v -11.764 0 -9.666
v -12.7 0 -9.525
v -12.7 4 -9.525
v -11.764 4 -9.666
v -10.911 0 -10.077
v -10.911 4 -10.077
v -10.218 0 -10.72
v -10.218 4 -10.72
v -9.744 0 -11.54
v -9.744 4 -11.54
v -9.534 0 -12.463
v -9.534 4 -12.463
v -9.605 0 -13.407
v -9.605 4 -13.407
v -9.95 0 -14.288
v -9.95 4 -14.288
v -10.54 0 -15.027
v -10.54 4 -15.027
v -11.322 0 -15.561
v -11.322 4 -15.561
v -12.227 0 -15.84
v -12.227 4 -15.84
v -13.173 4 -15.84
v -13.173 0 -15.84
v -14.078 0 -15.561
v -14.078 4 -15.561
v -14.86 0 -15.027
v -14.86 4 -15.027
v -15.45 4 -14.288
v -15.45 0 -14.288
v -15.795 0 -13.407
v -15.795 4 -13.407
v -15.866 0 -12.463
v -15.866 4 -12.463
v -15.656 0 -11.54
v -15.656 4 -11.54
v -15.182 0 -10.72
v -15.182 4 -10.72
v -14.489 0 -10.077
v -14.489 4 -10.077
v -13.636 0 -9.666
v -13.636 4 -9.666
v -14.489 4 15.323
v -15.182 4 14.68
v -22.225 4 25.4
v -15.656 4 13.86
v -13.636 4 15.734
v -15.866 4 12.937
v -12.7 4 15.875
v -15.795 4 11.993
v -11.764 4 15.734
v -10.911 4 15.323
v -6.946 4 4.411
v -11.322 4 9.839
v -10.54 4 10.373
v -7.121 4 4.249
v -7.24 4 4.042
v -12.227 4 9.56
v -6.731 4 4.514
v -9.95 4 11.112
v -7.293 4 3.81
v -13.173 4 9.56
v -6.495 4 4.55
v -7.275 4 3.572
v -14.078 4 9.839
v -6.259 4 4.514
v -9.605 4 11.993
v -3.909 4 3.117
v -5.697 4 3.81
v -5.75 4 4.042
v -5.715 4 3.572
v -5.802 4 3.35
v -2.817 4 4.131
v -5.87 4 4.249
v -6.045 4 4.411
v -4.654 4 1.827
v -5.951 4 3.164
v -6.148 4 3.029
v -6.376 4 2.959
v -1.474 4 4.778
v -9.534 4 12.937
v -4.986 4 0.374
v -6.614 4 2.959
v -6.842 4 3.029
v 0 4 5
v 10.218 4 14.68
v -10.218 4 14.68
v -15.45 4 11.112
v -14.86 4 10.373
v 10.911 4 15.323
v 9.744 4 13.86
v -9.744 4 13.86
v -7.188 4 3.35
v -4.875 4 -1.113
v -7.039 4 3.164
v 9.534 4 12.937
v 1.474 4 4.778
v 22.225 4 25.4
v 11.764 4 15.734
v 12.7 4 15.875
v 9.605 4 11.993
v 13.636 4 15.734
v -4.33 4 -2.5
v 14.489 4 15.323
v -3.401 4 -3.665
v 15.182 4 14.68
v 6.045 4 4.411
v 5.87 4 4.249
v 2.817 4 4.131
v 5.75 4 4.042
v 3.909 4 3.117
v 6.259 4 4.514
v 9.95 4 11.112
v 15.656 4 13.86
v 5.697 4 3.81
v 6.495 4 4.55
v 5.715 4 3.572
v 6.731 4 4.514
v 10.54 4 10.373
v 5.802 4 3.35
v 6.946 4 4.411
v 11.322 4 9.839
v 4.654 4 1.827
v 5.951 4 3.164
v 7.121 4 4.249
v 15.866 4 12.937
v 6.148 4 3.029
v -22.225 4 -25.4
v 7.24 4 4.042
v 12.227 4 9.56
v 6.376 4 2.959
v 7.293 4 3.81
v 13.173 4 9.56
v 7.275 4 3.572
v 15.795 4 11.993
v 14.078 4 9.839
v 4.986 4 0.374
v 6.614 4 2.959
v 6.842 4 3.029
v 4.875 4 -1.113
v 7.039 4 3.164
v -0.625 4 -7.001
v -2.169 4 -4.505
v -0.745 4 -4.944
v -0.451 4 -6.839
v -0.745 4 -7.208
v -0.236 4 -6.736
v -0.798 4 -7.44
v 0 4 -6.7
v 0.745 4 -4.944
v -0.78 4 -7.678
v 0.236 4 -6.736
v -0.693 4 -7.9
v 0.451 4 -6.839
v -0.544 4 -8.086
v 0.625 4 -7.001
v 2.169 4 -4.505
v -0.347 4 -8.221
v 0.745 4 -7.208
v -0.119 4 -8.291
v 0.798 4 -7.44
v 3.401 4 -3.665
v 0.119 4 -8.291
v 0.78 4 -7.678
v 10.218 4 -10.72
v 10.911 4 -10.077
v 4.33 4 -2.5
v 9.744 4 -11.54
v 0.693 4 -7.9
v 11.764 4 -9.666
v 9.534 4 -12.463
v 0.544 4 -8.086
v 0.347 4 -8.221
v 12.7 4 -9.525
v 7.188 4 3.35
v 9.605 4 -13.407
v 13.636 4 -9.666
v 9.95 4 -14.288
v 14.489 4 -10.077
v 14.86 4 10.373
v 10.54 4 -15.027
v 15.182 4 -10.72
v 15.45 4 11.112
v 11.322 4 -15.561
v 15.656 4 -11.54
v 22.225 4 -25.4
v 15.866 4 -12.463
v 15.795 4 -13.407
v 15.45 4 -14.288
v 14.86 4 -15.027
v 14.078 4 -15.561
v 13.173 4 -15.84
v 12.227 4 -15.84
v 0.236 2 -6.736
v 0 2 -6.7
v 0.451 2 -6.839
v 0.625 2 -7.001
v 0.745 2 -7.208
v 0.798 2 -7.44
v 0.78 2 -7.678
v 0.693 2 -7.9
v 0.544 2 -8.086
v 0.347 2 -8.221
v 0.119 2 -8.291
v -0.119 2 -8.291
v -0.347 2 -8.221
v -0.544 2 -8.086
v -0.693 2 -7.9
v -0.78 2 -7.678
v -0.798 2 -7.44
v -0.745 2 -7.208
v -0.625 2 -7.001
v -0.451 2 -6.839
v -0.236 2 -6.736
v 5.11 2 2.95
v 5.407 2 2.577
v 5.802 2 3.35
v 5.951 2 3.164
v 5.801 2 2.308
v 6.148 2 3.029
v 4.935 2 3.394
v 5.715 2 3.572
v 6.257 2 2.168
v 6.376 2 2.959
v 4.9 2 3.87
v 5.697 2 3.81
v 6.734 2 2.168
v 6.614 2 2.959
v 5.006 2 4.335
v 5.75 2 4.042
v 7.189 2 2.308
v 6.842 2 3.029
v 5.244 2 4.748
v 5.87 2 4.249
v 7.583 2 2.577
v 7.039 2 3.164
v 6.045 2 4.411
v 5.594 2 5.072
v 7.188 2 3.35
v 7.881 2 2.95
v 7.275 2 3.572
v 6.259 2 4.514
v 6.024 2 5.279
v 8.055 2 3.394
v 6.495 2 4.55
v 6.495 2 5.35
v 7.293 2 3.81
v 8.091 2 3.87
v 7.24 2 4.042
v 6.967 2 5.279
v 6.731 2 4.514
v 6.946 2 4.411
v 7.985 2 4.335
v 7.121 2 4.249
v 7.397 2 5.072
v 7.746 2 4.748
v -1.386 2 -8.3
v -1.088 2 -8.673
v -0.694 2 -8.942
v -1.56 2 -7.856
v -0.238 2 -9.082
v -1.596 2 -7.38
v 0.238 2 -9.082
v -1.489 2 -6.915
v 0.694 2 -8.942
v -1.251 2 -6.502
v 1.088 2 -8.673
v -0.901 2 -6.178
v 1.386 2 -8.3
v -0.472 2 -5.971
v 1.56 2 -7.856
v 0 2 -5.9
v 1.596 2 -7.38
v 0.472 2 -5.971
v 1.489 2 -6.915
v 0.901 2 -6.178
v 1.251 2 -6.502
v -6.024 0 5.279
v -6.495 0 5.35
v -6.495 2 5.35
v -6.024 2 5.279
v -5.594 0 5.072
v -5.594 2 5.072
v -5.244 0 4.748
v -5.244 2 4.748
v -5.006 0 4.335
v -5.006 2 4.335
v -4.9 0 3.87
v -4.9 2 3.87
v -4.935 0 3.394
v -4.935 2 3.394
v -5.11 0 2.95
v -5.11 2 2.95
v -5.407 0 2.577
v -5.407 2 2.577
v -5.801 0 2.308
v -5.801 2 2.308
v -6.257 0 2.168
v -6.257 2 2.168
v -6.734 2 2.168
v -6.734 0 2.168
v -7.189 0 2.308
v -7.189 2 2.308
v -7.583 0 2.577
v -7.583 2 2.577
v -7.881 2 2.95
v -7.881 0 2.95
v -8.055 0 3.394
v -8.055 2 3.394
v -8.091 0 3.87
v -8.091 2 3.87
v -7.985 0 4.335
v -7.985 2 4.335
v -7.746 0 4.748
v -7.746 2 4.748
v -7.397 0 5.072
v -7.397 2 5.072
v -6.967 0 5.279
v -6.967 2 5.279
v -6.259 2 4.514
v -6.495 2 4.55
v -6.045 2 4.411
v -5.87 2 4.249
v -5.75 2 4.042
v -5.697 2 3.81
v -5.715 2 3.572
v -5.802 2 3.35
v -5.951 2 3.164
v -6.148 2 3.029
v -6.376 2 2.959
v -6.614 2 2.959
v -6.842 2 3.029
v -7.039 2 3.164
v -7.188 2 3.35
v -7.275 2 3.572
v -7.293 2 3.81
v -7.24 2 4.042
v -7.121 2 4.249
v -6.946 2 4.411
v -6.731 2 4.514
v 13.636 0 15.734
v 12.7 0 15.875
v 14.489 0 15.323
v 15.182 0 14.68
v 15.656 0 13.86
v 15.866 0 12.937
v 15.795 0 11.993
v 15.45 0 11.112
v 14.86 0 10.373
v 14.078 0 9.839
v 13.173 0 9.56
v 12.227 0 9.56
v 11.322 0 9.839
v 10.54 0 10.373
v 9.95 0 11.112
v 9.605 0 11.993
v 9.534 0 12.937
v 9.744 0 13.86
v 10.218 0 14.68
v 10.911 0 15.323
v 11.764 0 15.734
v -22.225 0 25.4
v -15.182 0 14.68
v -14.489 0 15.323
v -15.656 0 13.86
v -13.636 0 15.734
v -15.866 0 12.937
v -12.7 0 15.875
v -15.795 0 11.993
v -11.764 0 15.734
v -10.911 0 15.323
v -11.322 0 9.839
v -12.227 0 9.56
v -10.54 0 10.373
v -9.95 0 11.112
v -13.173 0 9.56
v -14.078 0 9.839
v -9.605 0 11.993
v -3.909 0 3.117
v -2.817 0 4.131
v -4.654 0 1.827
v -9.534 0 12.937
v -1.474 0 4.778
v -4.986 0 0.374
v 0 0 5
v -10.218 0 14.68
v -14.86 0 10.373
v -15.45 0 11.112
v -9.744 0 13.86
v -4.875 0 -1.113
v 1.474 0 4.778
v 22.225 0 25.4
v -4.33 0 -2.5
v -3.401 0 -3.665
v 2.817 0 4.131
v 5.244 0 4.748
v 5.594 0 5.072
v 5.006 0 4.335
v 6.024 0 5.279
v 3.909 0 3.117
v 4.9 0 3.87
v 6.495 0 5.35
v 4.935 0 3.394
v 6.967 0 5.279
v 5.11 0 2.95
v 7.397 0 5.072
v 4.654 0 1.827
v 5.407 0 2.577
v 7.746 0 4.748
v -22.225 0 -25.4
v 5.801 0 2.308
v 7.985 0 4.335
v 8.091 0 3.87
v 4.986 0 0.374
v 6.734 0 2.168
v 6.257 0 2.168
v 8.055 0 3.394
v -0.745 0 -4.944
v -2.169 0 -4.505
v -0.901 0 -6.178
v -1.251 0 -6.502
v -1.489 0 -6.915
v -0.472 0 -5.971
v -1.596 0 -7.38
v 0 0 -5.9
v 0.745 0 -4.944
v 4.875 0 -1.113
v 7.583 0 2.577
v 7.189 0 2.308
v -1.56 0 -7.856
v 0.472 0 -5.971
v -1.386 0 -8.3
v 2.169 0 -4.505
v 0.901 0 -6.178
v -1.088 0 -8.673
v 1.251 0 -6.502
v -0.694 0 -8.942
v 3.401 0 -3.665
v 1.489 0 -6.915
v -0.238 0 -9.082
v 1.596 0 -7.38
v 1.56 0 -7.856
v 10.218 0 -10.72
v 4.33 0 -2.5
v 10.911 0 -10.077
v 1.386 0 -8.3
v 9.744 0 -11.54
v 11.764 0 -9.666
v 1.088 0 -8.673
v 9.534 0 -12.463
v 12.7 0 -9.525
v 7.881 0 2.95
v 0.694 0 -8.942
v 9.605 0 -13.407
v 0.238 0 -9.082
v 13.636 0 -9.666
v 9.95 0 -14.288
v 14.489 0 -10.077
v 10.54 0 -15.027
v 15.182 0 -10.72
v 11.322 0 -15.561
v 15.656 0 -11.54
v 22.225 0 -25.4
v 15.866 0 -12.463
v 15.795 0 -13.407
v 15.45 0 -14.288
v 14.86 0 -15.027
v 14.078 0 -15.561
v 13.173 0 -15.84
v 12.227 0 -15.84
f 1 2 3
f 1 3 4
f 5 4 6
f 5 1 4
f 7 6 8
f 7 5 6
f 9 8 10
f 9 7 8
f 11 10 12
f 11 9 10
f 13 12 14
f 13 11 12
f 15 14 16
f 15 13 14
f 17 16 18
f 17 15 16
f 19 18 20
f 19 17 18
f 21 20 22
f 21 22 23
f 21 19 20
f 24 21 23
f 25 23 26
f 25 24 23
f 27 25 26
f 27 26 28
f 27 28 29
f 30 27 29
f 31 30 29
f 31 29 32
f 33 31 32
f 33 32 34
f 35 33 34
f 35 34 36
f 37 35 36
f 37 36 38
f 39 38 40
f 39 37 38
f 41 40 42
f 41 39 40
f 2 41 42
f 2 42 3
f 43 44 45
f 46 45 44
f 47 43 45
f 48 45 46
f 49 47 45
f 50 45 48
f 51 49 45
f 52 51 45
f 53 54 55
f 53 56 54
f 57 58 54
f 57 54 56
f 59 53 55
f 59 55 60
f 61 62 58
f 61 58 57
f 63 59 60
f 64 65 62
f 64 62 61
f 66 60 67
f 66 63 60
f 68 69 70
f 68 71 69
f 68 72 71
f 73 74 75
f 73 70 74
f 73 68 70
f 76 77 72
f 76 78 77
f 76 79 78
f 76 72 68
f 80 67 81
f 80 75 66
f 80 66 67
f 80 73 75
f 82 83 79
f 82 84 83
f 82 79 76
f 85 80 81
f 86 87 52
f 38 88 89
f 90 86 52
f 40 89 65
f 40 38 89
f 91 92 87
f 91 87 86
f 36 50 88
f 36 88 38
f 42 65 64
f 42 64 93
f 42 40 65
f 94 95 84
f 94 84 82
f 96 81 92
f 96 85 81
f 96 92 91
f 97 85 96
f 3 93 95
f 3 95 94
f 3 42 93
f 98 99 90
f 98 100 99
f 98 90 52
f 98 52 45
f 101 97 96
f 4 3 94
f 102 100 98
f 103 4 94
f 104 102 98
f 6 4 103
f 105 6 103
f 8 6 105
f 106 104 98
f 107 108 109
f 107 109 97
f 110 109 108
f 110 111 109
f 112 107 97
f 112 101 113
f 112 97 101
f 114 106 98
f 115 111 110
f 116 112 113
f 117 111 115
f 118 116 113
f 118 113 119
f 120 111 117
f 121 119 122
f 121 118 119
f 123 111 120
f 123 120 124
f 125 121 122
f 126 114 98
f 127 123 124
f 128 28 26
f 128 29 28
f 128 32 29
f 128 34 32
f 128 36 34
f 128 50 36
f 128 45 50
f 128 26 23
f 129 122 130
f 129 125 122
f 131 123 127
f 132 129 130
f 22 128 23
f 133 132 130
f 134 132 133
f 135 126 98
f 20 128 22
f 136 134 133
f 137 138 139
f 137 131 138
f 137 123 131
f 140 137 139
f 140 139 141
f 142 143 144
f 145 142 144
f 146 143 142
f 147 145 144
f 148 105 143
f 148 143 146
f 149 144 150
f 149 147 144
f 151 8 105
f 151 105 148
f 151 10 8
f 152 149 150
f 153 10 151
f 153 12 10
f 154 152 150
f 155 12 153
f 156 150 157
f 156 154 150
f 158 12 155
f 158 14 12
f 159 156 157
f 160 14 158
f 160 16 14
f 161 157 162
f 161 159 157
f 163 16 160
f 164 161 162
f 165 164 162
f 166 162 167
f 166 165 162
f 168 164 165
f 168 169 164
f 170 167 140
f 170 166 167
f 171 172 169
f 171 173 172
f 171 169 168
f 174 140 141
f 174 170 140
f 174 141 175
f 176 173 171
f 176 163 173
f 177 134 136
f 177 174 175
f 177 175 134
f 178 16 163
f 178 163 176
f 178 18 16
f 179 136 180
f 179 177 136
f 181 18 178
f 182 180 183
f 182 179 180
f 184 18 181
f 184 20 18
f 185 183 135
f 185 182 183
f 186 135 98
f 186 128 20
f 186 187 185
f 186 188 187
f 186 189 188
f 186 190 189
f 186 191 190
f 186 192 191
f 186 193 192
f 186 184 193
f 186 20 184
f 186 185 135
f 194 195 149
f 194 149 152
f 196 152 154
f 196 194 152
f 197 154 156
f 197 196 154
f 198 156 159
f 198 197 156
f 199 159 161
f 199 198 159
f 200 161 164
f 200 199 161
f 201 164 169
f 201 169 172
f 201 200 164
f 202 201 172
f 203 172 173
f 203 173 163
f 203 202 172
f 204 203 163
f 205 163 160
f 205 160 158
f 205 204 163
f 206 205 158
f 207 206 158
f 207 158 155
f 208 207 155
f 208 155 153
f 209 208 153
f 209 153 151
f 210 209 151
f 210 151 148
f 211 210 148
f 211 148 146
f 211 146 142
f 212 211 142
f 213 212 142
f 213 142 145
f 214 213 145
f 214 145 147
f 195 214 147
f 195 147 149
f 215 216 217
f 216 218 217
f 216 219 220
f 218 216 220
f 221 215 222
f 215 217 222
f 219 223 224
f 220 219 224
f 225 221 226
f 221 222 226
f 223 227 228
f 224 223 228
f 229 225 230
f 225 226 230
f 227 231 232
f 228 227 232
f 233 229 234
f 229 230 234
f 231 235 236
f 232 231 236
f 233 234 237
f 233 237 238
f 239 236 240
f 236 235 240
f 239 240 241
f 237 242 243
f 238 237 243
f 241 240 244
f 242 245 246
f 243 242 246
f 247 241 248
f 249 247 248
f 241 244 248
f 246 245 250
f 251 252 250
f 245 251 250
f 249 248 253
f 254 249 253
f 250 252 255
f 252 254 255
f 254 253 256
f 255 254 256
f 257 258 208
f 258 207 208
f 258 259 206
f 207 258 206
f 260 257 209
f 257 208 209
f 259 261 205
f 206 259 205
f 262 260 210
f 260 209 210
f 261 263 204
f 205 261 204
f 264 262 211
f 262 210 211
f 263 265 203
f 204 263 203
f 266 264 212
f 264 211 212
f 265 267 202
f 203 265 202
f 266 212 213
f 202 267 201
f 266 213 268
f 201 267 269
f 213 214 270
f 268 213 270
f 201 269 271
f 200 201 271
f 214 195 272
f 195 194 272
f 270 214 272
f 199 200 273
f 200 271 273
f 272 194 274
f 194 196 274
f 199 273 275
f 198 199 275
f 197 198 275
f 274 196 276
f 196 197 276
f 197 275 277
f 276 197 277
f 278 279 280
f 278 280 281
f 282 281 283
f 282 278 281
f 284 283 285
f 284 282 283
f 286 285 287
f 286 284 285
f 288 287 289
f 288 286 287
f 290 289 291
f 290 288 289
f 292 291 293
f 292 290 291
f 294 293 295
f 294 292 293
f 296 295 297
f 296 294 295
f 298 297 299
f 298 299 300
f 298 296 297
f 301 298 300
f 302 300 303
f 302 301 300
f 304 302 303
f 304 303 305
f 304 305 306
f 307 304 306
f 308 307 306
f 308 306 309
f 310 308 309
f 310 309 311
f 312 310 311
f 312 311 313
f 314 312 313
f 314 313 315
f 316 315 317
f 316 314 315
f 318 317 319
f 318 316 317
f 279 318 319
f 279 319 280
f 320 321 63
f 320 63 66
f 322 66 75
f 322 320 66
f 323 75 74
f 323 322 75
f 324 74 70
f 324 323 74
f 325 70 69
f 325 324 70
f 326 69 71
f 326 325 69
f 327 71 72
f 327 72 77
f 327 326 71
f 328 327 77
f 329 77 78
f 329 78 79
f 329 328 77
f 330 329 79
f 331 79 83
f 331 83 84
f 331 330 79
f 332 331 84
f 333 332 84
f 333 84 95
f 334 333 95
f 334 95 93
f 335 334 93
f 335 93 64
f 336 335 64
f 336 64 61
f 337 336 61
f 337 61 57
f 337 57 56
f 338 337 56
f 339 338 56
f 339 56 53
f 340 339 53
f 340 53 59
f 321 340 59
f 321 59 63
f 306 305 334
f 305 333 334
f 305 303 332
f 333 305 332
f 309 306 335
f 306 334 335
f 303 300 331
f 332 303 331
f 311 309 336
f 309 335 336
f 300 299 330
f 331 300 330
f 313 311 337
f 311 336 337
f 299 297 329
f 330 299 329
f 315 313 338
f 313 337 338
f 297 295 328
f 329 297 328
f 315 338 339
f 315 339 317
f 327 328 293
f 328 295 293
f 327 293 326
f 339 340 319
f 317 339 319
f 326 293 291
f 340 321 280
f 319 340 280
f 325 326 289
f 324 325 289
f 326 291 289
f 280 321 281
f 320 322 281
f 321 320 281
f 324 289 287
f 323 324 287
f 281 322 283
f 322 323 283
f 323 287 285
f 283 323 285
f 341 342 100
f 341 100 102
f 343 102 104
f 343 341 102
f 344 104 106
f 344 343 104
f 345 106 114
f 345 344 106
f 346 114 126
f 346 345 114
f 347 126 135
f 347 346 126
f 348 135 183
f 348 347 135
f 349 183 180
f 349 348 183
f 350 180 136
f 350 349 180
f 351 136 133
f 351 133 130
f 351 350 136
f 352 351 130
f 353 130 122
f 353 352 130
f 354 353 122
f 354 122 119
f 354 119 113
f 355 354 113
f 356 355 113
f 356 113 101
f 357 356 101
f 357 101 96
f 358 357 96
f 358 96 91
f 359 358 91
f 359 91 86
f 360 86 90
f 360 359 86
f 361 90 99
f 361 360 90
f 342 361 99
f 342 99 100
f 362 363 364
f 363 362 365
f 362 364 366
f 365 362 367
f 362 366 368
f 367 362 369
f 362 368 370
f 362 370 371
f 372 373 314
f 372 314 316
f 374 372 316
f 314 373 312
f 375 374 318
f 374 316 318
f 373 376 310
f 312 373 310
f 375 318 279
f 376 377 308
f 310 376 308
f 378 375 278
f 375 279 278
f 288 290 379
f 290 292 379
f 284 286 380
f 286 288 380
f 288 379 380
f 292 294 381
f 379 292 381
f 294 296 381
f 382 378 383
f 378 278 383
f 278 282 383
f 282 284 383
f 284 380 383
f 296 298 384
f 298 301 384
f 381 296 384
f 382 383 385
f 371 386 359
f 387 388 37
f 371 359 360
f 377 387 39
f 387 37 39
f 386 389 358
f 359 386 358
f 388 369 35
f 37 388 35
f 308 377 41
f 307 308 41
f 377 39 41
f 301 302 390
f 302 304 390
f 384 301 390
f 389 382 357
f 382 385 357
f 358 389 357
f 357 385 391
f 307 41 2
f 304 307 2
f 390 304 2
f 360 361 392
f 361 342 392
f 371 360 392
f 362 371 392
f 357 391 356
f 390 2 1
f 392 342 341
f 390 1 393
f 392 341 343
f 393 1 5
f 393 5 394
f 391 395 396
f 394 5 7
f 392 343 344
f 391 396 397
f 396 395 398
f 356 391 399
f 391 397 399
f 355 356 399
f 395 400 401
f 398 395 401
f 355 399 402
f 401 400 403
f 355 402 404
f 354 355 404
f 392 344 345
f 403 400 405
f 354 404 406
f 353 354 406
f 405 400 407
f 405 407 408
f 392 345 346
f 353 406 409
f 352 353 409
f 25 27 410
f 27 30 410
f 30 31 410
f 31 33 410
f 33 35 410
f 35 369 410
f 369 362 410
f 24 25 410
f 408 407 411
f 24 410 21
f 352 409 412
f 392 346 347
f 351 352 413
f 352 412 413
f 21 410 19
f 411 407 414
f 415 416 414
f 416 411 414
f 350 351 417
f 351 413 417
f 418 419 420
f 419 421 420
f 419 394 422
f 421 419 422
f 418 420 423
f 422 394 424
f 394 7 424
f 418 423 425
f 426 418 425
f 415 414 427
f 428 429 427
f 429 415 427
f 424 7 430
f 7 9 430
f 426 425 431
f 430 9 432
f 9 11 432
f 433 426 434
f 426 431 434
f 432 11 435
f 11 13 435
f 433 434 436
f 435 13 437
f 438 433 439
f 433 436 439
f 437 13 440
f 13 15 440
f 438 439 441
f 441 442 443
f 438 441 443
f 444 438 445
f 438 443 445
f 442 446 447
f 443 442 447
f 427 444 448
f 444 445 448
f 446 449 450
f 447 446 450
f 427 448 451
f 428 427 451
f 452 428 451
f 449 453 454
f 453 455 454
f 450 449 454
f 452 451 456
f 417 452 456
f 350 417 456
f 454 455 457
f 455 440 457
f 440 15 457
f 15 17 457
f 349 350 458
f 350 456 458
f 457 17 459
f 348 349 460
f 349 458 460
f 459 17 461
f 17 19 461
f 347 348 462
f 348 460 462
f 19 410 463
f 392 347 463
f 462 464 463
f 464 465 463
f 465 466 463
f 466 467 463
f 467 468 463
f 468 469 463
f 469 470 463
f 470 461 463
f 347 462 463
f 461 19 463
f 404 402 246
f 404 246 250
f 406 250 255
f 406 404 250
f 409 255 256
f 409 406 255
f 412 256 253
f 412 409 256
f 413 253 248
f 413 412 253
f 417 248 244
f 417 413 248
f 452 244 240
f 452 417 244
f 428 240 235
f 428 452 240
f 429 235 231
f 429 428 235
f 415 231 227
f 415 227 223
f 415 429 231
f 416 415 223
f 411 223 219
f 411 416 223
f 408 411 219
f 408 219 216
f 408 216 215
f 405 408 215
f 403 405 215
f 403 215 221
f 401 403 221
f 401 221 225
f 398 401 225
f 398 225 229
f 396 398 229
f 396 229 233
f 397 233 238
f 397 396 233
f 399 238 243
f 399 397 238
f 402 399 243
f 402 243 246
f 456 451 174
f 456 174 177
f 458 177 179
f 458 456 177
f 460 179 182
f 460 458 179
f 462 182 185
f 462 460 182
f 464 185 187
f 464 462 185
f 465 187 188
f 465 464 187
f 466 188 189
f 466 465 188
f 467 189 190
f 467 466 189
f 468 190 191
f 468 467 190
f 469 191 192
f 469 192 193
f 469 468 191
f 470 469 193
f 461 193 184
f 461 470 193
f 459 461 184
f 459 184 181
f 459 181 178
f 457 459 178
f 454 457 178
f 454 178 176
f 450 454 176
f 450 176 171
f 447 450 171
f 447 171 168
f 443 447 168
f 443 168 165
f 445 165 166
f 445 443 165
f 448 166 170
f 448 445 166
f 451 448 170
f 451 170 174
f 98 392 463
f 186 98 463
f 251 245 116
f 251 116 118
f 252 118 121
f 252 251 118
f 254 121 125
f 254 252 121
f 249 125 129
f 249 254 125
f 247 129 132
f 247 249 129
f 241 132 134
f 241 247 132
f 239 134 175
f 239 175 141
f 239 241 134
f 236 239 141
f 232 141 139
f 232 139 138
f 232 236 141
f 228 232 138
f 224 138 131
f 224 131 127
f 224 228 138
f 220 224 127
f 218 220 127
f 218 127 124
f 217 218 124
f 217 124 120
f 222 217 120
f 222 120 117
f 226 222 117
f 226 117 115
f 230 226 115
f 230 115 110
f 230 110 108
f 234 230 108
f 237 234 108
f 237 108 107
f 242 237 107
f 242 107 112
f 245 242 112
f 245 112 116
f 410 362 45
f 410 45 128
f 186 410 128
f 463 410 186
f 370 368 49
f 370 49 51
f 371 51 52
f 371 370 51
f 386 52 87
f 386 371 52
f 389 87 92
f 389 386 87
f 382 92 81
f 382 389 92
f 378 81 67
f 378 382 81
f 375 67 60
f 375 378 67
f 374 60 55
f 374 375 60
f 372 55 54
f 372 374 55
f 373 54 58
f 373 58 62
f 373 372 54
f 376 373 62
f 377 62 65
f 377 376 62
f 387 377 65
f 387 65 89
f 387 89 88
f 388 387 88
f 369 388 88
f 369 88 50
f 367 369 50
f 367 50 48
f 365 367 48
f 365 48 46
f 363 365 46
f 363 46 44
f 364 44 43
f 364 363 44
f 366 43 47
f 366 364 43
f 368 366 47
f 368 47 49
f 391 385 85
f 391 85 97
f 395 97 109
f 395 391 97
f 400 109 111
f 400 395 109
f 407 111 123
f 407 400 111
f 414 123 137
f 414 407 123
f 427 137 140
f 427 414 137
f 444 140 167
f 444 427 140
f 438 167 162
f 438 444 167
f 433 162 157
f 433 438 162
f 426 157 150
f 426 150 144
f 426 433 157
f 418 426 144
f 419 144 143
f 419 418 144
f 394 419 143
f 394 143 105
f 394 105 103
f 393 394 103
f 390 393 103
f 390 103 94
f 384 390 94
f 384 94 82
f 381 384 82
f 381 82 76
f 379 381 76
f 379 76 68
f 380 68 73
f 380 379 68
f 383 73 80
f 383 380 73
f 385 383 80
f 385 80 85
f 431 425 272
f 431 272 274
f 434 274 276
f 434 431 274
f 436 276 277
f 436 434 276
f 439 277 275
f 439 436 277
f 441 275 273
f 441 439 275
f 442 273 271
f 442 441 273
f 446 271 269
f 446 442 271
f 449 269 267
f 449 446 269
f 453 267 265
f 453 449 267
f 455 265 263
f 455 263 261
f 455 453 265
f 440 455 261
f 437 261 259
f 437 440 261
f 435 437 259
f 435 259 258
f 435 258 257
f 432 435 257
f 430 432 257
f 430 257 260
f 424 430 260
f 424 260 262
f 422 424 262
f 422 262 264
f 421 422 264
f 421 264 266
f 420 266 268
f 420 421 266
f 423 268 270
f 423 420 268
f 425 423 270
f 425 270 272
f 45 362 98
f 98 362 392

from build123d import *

# Parameters (mm, degrees)
SKETCH1_R           = 3.175
SKETCH1_R_2         = 0.8
SKETCH1_R_3         = 5
BOSS_EXTRUDE1_DEPTH = 4
SKETCH2_R           = 1.6
CUT_EXTRUDE2_DEPTH  = 2


with BuildPart() as part:
    # Sketch1 → Boss-Extrude1 (new body)
    with BuildSketch(Plane(origin=(0, 0, 0), x_dir=(1, 0, 0), z_dir=(0, 1, 0))):
        Polygon((-22.225, -25.4), (-12.829728408, -25.4), (0, -25.4), (12.829728408, -25.4), (22.225, -25.4), (22.225, 25.4), (-22.225, 25.4), align=None)
        with Locations((-12.7, -12.7)):
            Circle(SKETCH1_R, mode=Mode.SUBTRACT)
        with Locations((-6.495190528, -3.75)):
            Circle(SKETCH1_R_2, mode=Mode.SUBTRACT)
        Circle(SKETCH1_R_3, mode=Mode.SUBTRACT)
        with Locations((6.495190528, -3.75)):
            Circle(SKETCH1_R_2, mode=Mode.SUBTRACT)
        with Locations((12.7, -12.7)):
            Circle(SKETCH1_R, mode=Mode.SUBTRACT)
        with Locations((-12.7, 12.7)):
            Circle(SKETCH1_R, mode=Mode.SUBTRACT)
        with Locations((0, 7.5)):
            Circle(SKETCH1_R_2, mode=Mode.SUBTRACT)
        with Locations((12.7, 12.7)):
            Circle(SKETCH1_R, mode=Mode.SUBTRACT)
    extrude(amount=BOSS_EXTRUDE1_DEPTH)

    # Sketch2 → Cut-Extrude2 (cut)
    with BuildSketch(Plane(origin=(0, 0, 0), x_dir=(1, 0, 0), z_dir=(0, 1, 0))):
        with Locations((6.495190528, -3.75)):
            Circle(SKETCH2_R)
        with Locations((-6.495190528, -3.75)):
            Circle(SKETCH2_R)
        with Locations((0, 7.5)):
            Circle(SKETCH2_R)
    extrude(amount=CUT_EXTRUDE2_DEPTH, mode=Mode.SUBTRACT)


solid = part.part
